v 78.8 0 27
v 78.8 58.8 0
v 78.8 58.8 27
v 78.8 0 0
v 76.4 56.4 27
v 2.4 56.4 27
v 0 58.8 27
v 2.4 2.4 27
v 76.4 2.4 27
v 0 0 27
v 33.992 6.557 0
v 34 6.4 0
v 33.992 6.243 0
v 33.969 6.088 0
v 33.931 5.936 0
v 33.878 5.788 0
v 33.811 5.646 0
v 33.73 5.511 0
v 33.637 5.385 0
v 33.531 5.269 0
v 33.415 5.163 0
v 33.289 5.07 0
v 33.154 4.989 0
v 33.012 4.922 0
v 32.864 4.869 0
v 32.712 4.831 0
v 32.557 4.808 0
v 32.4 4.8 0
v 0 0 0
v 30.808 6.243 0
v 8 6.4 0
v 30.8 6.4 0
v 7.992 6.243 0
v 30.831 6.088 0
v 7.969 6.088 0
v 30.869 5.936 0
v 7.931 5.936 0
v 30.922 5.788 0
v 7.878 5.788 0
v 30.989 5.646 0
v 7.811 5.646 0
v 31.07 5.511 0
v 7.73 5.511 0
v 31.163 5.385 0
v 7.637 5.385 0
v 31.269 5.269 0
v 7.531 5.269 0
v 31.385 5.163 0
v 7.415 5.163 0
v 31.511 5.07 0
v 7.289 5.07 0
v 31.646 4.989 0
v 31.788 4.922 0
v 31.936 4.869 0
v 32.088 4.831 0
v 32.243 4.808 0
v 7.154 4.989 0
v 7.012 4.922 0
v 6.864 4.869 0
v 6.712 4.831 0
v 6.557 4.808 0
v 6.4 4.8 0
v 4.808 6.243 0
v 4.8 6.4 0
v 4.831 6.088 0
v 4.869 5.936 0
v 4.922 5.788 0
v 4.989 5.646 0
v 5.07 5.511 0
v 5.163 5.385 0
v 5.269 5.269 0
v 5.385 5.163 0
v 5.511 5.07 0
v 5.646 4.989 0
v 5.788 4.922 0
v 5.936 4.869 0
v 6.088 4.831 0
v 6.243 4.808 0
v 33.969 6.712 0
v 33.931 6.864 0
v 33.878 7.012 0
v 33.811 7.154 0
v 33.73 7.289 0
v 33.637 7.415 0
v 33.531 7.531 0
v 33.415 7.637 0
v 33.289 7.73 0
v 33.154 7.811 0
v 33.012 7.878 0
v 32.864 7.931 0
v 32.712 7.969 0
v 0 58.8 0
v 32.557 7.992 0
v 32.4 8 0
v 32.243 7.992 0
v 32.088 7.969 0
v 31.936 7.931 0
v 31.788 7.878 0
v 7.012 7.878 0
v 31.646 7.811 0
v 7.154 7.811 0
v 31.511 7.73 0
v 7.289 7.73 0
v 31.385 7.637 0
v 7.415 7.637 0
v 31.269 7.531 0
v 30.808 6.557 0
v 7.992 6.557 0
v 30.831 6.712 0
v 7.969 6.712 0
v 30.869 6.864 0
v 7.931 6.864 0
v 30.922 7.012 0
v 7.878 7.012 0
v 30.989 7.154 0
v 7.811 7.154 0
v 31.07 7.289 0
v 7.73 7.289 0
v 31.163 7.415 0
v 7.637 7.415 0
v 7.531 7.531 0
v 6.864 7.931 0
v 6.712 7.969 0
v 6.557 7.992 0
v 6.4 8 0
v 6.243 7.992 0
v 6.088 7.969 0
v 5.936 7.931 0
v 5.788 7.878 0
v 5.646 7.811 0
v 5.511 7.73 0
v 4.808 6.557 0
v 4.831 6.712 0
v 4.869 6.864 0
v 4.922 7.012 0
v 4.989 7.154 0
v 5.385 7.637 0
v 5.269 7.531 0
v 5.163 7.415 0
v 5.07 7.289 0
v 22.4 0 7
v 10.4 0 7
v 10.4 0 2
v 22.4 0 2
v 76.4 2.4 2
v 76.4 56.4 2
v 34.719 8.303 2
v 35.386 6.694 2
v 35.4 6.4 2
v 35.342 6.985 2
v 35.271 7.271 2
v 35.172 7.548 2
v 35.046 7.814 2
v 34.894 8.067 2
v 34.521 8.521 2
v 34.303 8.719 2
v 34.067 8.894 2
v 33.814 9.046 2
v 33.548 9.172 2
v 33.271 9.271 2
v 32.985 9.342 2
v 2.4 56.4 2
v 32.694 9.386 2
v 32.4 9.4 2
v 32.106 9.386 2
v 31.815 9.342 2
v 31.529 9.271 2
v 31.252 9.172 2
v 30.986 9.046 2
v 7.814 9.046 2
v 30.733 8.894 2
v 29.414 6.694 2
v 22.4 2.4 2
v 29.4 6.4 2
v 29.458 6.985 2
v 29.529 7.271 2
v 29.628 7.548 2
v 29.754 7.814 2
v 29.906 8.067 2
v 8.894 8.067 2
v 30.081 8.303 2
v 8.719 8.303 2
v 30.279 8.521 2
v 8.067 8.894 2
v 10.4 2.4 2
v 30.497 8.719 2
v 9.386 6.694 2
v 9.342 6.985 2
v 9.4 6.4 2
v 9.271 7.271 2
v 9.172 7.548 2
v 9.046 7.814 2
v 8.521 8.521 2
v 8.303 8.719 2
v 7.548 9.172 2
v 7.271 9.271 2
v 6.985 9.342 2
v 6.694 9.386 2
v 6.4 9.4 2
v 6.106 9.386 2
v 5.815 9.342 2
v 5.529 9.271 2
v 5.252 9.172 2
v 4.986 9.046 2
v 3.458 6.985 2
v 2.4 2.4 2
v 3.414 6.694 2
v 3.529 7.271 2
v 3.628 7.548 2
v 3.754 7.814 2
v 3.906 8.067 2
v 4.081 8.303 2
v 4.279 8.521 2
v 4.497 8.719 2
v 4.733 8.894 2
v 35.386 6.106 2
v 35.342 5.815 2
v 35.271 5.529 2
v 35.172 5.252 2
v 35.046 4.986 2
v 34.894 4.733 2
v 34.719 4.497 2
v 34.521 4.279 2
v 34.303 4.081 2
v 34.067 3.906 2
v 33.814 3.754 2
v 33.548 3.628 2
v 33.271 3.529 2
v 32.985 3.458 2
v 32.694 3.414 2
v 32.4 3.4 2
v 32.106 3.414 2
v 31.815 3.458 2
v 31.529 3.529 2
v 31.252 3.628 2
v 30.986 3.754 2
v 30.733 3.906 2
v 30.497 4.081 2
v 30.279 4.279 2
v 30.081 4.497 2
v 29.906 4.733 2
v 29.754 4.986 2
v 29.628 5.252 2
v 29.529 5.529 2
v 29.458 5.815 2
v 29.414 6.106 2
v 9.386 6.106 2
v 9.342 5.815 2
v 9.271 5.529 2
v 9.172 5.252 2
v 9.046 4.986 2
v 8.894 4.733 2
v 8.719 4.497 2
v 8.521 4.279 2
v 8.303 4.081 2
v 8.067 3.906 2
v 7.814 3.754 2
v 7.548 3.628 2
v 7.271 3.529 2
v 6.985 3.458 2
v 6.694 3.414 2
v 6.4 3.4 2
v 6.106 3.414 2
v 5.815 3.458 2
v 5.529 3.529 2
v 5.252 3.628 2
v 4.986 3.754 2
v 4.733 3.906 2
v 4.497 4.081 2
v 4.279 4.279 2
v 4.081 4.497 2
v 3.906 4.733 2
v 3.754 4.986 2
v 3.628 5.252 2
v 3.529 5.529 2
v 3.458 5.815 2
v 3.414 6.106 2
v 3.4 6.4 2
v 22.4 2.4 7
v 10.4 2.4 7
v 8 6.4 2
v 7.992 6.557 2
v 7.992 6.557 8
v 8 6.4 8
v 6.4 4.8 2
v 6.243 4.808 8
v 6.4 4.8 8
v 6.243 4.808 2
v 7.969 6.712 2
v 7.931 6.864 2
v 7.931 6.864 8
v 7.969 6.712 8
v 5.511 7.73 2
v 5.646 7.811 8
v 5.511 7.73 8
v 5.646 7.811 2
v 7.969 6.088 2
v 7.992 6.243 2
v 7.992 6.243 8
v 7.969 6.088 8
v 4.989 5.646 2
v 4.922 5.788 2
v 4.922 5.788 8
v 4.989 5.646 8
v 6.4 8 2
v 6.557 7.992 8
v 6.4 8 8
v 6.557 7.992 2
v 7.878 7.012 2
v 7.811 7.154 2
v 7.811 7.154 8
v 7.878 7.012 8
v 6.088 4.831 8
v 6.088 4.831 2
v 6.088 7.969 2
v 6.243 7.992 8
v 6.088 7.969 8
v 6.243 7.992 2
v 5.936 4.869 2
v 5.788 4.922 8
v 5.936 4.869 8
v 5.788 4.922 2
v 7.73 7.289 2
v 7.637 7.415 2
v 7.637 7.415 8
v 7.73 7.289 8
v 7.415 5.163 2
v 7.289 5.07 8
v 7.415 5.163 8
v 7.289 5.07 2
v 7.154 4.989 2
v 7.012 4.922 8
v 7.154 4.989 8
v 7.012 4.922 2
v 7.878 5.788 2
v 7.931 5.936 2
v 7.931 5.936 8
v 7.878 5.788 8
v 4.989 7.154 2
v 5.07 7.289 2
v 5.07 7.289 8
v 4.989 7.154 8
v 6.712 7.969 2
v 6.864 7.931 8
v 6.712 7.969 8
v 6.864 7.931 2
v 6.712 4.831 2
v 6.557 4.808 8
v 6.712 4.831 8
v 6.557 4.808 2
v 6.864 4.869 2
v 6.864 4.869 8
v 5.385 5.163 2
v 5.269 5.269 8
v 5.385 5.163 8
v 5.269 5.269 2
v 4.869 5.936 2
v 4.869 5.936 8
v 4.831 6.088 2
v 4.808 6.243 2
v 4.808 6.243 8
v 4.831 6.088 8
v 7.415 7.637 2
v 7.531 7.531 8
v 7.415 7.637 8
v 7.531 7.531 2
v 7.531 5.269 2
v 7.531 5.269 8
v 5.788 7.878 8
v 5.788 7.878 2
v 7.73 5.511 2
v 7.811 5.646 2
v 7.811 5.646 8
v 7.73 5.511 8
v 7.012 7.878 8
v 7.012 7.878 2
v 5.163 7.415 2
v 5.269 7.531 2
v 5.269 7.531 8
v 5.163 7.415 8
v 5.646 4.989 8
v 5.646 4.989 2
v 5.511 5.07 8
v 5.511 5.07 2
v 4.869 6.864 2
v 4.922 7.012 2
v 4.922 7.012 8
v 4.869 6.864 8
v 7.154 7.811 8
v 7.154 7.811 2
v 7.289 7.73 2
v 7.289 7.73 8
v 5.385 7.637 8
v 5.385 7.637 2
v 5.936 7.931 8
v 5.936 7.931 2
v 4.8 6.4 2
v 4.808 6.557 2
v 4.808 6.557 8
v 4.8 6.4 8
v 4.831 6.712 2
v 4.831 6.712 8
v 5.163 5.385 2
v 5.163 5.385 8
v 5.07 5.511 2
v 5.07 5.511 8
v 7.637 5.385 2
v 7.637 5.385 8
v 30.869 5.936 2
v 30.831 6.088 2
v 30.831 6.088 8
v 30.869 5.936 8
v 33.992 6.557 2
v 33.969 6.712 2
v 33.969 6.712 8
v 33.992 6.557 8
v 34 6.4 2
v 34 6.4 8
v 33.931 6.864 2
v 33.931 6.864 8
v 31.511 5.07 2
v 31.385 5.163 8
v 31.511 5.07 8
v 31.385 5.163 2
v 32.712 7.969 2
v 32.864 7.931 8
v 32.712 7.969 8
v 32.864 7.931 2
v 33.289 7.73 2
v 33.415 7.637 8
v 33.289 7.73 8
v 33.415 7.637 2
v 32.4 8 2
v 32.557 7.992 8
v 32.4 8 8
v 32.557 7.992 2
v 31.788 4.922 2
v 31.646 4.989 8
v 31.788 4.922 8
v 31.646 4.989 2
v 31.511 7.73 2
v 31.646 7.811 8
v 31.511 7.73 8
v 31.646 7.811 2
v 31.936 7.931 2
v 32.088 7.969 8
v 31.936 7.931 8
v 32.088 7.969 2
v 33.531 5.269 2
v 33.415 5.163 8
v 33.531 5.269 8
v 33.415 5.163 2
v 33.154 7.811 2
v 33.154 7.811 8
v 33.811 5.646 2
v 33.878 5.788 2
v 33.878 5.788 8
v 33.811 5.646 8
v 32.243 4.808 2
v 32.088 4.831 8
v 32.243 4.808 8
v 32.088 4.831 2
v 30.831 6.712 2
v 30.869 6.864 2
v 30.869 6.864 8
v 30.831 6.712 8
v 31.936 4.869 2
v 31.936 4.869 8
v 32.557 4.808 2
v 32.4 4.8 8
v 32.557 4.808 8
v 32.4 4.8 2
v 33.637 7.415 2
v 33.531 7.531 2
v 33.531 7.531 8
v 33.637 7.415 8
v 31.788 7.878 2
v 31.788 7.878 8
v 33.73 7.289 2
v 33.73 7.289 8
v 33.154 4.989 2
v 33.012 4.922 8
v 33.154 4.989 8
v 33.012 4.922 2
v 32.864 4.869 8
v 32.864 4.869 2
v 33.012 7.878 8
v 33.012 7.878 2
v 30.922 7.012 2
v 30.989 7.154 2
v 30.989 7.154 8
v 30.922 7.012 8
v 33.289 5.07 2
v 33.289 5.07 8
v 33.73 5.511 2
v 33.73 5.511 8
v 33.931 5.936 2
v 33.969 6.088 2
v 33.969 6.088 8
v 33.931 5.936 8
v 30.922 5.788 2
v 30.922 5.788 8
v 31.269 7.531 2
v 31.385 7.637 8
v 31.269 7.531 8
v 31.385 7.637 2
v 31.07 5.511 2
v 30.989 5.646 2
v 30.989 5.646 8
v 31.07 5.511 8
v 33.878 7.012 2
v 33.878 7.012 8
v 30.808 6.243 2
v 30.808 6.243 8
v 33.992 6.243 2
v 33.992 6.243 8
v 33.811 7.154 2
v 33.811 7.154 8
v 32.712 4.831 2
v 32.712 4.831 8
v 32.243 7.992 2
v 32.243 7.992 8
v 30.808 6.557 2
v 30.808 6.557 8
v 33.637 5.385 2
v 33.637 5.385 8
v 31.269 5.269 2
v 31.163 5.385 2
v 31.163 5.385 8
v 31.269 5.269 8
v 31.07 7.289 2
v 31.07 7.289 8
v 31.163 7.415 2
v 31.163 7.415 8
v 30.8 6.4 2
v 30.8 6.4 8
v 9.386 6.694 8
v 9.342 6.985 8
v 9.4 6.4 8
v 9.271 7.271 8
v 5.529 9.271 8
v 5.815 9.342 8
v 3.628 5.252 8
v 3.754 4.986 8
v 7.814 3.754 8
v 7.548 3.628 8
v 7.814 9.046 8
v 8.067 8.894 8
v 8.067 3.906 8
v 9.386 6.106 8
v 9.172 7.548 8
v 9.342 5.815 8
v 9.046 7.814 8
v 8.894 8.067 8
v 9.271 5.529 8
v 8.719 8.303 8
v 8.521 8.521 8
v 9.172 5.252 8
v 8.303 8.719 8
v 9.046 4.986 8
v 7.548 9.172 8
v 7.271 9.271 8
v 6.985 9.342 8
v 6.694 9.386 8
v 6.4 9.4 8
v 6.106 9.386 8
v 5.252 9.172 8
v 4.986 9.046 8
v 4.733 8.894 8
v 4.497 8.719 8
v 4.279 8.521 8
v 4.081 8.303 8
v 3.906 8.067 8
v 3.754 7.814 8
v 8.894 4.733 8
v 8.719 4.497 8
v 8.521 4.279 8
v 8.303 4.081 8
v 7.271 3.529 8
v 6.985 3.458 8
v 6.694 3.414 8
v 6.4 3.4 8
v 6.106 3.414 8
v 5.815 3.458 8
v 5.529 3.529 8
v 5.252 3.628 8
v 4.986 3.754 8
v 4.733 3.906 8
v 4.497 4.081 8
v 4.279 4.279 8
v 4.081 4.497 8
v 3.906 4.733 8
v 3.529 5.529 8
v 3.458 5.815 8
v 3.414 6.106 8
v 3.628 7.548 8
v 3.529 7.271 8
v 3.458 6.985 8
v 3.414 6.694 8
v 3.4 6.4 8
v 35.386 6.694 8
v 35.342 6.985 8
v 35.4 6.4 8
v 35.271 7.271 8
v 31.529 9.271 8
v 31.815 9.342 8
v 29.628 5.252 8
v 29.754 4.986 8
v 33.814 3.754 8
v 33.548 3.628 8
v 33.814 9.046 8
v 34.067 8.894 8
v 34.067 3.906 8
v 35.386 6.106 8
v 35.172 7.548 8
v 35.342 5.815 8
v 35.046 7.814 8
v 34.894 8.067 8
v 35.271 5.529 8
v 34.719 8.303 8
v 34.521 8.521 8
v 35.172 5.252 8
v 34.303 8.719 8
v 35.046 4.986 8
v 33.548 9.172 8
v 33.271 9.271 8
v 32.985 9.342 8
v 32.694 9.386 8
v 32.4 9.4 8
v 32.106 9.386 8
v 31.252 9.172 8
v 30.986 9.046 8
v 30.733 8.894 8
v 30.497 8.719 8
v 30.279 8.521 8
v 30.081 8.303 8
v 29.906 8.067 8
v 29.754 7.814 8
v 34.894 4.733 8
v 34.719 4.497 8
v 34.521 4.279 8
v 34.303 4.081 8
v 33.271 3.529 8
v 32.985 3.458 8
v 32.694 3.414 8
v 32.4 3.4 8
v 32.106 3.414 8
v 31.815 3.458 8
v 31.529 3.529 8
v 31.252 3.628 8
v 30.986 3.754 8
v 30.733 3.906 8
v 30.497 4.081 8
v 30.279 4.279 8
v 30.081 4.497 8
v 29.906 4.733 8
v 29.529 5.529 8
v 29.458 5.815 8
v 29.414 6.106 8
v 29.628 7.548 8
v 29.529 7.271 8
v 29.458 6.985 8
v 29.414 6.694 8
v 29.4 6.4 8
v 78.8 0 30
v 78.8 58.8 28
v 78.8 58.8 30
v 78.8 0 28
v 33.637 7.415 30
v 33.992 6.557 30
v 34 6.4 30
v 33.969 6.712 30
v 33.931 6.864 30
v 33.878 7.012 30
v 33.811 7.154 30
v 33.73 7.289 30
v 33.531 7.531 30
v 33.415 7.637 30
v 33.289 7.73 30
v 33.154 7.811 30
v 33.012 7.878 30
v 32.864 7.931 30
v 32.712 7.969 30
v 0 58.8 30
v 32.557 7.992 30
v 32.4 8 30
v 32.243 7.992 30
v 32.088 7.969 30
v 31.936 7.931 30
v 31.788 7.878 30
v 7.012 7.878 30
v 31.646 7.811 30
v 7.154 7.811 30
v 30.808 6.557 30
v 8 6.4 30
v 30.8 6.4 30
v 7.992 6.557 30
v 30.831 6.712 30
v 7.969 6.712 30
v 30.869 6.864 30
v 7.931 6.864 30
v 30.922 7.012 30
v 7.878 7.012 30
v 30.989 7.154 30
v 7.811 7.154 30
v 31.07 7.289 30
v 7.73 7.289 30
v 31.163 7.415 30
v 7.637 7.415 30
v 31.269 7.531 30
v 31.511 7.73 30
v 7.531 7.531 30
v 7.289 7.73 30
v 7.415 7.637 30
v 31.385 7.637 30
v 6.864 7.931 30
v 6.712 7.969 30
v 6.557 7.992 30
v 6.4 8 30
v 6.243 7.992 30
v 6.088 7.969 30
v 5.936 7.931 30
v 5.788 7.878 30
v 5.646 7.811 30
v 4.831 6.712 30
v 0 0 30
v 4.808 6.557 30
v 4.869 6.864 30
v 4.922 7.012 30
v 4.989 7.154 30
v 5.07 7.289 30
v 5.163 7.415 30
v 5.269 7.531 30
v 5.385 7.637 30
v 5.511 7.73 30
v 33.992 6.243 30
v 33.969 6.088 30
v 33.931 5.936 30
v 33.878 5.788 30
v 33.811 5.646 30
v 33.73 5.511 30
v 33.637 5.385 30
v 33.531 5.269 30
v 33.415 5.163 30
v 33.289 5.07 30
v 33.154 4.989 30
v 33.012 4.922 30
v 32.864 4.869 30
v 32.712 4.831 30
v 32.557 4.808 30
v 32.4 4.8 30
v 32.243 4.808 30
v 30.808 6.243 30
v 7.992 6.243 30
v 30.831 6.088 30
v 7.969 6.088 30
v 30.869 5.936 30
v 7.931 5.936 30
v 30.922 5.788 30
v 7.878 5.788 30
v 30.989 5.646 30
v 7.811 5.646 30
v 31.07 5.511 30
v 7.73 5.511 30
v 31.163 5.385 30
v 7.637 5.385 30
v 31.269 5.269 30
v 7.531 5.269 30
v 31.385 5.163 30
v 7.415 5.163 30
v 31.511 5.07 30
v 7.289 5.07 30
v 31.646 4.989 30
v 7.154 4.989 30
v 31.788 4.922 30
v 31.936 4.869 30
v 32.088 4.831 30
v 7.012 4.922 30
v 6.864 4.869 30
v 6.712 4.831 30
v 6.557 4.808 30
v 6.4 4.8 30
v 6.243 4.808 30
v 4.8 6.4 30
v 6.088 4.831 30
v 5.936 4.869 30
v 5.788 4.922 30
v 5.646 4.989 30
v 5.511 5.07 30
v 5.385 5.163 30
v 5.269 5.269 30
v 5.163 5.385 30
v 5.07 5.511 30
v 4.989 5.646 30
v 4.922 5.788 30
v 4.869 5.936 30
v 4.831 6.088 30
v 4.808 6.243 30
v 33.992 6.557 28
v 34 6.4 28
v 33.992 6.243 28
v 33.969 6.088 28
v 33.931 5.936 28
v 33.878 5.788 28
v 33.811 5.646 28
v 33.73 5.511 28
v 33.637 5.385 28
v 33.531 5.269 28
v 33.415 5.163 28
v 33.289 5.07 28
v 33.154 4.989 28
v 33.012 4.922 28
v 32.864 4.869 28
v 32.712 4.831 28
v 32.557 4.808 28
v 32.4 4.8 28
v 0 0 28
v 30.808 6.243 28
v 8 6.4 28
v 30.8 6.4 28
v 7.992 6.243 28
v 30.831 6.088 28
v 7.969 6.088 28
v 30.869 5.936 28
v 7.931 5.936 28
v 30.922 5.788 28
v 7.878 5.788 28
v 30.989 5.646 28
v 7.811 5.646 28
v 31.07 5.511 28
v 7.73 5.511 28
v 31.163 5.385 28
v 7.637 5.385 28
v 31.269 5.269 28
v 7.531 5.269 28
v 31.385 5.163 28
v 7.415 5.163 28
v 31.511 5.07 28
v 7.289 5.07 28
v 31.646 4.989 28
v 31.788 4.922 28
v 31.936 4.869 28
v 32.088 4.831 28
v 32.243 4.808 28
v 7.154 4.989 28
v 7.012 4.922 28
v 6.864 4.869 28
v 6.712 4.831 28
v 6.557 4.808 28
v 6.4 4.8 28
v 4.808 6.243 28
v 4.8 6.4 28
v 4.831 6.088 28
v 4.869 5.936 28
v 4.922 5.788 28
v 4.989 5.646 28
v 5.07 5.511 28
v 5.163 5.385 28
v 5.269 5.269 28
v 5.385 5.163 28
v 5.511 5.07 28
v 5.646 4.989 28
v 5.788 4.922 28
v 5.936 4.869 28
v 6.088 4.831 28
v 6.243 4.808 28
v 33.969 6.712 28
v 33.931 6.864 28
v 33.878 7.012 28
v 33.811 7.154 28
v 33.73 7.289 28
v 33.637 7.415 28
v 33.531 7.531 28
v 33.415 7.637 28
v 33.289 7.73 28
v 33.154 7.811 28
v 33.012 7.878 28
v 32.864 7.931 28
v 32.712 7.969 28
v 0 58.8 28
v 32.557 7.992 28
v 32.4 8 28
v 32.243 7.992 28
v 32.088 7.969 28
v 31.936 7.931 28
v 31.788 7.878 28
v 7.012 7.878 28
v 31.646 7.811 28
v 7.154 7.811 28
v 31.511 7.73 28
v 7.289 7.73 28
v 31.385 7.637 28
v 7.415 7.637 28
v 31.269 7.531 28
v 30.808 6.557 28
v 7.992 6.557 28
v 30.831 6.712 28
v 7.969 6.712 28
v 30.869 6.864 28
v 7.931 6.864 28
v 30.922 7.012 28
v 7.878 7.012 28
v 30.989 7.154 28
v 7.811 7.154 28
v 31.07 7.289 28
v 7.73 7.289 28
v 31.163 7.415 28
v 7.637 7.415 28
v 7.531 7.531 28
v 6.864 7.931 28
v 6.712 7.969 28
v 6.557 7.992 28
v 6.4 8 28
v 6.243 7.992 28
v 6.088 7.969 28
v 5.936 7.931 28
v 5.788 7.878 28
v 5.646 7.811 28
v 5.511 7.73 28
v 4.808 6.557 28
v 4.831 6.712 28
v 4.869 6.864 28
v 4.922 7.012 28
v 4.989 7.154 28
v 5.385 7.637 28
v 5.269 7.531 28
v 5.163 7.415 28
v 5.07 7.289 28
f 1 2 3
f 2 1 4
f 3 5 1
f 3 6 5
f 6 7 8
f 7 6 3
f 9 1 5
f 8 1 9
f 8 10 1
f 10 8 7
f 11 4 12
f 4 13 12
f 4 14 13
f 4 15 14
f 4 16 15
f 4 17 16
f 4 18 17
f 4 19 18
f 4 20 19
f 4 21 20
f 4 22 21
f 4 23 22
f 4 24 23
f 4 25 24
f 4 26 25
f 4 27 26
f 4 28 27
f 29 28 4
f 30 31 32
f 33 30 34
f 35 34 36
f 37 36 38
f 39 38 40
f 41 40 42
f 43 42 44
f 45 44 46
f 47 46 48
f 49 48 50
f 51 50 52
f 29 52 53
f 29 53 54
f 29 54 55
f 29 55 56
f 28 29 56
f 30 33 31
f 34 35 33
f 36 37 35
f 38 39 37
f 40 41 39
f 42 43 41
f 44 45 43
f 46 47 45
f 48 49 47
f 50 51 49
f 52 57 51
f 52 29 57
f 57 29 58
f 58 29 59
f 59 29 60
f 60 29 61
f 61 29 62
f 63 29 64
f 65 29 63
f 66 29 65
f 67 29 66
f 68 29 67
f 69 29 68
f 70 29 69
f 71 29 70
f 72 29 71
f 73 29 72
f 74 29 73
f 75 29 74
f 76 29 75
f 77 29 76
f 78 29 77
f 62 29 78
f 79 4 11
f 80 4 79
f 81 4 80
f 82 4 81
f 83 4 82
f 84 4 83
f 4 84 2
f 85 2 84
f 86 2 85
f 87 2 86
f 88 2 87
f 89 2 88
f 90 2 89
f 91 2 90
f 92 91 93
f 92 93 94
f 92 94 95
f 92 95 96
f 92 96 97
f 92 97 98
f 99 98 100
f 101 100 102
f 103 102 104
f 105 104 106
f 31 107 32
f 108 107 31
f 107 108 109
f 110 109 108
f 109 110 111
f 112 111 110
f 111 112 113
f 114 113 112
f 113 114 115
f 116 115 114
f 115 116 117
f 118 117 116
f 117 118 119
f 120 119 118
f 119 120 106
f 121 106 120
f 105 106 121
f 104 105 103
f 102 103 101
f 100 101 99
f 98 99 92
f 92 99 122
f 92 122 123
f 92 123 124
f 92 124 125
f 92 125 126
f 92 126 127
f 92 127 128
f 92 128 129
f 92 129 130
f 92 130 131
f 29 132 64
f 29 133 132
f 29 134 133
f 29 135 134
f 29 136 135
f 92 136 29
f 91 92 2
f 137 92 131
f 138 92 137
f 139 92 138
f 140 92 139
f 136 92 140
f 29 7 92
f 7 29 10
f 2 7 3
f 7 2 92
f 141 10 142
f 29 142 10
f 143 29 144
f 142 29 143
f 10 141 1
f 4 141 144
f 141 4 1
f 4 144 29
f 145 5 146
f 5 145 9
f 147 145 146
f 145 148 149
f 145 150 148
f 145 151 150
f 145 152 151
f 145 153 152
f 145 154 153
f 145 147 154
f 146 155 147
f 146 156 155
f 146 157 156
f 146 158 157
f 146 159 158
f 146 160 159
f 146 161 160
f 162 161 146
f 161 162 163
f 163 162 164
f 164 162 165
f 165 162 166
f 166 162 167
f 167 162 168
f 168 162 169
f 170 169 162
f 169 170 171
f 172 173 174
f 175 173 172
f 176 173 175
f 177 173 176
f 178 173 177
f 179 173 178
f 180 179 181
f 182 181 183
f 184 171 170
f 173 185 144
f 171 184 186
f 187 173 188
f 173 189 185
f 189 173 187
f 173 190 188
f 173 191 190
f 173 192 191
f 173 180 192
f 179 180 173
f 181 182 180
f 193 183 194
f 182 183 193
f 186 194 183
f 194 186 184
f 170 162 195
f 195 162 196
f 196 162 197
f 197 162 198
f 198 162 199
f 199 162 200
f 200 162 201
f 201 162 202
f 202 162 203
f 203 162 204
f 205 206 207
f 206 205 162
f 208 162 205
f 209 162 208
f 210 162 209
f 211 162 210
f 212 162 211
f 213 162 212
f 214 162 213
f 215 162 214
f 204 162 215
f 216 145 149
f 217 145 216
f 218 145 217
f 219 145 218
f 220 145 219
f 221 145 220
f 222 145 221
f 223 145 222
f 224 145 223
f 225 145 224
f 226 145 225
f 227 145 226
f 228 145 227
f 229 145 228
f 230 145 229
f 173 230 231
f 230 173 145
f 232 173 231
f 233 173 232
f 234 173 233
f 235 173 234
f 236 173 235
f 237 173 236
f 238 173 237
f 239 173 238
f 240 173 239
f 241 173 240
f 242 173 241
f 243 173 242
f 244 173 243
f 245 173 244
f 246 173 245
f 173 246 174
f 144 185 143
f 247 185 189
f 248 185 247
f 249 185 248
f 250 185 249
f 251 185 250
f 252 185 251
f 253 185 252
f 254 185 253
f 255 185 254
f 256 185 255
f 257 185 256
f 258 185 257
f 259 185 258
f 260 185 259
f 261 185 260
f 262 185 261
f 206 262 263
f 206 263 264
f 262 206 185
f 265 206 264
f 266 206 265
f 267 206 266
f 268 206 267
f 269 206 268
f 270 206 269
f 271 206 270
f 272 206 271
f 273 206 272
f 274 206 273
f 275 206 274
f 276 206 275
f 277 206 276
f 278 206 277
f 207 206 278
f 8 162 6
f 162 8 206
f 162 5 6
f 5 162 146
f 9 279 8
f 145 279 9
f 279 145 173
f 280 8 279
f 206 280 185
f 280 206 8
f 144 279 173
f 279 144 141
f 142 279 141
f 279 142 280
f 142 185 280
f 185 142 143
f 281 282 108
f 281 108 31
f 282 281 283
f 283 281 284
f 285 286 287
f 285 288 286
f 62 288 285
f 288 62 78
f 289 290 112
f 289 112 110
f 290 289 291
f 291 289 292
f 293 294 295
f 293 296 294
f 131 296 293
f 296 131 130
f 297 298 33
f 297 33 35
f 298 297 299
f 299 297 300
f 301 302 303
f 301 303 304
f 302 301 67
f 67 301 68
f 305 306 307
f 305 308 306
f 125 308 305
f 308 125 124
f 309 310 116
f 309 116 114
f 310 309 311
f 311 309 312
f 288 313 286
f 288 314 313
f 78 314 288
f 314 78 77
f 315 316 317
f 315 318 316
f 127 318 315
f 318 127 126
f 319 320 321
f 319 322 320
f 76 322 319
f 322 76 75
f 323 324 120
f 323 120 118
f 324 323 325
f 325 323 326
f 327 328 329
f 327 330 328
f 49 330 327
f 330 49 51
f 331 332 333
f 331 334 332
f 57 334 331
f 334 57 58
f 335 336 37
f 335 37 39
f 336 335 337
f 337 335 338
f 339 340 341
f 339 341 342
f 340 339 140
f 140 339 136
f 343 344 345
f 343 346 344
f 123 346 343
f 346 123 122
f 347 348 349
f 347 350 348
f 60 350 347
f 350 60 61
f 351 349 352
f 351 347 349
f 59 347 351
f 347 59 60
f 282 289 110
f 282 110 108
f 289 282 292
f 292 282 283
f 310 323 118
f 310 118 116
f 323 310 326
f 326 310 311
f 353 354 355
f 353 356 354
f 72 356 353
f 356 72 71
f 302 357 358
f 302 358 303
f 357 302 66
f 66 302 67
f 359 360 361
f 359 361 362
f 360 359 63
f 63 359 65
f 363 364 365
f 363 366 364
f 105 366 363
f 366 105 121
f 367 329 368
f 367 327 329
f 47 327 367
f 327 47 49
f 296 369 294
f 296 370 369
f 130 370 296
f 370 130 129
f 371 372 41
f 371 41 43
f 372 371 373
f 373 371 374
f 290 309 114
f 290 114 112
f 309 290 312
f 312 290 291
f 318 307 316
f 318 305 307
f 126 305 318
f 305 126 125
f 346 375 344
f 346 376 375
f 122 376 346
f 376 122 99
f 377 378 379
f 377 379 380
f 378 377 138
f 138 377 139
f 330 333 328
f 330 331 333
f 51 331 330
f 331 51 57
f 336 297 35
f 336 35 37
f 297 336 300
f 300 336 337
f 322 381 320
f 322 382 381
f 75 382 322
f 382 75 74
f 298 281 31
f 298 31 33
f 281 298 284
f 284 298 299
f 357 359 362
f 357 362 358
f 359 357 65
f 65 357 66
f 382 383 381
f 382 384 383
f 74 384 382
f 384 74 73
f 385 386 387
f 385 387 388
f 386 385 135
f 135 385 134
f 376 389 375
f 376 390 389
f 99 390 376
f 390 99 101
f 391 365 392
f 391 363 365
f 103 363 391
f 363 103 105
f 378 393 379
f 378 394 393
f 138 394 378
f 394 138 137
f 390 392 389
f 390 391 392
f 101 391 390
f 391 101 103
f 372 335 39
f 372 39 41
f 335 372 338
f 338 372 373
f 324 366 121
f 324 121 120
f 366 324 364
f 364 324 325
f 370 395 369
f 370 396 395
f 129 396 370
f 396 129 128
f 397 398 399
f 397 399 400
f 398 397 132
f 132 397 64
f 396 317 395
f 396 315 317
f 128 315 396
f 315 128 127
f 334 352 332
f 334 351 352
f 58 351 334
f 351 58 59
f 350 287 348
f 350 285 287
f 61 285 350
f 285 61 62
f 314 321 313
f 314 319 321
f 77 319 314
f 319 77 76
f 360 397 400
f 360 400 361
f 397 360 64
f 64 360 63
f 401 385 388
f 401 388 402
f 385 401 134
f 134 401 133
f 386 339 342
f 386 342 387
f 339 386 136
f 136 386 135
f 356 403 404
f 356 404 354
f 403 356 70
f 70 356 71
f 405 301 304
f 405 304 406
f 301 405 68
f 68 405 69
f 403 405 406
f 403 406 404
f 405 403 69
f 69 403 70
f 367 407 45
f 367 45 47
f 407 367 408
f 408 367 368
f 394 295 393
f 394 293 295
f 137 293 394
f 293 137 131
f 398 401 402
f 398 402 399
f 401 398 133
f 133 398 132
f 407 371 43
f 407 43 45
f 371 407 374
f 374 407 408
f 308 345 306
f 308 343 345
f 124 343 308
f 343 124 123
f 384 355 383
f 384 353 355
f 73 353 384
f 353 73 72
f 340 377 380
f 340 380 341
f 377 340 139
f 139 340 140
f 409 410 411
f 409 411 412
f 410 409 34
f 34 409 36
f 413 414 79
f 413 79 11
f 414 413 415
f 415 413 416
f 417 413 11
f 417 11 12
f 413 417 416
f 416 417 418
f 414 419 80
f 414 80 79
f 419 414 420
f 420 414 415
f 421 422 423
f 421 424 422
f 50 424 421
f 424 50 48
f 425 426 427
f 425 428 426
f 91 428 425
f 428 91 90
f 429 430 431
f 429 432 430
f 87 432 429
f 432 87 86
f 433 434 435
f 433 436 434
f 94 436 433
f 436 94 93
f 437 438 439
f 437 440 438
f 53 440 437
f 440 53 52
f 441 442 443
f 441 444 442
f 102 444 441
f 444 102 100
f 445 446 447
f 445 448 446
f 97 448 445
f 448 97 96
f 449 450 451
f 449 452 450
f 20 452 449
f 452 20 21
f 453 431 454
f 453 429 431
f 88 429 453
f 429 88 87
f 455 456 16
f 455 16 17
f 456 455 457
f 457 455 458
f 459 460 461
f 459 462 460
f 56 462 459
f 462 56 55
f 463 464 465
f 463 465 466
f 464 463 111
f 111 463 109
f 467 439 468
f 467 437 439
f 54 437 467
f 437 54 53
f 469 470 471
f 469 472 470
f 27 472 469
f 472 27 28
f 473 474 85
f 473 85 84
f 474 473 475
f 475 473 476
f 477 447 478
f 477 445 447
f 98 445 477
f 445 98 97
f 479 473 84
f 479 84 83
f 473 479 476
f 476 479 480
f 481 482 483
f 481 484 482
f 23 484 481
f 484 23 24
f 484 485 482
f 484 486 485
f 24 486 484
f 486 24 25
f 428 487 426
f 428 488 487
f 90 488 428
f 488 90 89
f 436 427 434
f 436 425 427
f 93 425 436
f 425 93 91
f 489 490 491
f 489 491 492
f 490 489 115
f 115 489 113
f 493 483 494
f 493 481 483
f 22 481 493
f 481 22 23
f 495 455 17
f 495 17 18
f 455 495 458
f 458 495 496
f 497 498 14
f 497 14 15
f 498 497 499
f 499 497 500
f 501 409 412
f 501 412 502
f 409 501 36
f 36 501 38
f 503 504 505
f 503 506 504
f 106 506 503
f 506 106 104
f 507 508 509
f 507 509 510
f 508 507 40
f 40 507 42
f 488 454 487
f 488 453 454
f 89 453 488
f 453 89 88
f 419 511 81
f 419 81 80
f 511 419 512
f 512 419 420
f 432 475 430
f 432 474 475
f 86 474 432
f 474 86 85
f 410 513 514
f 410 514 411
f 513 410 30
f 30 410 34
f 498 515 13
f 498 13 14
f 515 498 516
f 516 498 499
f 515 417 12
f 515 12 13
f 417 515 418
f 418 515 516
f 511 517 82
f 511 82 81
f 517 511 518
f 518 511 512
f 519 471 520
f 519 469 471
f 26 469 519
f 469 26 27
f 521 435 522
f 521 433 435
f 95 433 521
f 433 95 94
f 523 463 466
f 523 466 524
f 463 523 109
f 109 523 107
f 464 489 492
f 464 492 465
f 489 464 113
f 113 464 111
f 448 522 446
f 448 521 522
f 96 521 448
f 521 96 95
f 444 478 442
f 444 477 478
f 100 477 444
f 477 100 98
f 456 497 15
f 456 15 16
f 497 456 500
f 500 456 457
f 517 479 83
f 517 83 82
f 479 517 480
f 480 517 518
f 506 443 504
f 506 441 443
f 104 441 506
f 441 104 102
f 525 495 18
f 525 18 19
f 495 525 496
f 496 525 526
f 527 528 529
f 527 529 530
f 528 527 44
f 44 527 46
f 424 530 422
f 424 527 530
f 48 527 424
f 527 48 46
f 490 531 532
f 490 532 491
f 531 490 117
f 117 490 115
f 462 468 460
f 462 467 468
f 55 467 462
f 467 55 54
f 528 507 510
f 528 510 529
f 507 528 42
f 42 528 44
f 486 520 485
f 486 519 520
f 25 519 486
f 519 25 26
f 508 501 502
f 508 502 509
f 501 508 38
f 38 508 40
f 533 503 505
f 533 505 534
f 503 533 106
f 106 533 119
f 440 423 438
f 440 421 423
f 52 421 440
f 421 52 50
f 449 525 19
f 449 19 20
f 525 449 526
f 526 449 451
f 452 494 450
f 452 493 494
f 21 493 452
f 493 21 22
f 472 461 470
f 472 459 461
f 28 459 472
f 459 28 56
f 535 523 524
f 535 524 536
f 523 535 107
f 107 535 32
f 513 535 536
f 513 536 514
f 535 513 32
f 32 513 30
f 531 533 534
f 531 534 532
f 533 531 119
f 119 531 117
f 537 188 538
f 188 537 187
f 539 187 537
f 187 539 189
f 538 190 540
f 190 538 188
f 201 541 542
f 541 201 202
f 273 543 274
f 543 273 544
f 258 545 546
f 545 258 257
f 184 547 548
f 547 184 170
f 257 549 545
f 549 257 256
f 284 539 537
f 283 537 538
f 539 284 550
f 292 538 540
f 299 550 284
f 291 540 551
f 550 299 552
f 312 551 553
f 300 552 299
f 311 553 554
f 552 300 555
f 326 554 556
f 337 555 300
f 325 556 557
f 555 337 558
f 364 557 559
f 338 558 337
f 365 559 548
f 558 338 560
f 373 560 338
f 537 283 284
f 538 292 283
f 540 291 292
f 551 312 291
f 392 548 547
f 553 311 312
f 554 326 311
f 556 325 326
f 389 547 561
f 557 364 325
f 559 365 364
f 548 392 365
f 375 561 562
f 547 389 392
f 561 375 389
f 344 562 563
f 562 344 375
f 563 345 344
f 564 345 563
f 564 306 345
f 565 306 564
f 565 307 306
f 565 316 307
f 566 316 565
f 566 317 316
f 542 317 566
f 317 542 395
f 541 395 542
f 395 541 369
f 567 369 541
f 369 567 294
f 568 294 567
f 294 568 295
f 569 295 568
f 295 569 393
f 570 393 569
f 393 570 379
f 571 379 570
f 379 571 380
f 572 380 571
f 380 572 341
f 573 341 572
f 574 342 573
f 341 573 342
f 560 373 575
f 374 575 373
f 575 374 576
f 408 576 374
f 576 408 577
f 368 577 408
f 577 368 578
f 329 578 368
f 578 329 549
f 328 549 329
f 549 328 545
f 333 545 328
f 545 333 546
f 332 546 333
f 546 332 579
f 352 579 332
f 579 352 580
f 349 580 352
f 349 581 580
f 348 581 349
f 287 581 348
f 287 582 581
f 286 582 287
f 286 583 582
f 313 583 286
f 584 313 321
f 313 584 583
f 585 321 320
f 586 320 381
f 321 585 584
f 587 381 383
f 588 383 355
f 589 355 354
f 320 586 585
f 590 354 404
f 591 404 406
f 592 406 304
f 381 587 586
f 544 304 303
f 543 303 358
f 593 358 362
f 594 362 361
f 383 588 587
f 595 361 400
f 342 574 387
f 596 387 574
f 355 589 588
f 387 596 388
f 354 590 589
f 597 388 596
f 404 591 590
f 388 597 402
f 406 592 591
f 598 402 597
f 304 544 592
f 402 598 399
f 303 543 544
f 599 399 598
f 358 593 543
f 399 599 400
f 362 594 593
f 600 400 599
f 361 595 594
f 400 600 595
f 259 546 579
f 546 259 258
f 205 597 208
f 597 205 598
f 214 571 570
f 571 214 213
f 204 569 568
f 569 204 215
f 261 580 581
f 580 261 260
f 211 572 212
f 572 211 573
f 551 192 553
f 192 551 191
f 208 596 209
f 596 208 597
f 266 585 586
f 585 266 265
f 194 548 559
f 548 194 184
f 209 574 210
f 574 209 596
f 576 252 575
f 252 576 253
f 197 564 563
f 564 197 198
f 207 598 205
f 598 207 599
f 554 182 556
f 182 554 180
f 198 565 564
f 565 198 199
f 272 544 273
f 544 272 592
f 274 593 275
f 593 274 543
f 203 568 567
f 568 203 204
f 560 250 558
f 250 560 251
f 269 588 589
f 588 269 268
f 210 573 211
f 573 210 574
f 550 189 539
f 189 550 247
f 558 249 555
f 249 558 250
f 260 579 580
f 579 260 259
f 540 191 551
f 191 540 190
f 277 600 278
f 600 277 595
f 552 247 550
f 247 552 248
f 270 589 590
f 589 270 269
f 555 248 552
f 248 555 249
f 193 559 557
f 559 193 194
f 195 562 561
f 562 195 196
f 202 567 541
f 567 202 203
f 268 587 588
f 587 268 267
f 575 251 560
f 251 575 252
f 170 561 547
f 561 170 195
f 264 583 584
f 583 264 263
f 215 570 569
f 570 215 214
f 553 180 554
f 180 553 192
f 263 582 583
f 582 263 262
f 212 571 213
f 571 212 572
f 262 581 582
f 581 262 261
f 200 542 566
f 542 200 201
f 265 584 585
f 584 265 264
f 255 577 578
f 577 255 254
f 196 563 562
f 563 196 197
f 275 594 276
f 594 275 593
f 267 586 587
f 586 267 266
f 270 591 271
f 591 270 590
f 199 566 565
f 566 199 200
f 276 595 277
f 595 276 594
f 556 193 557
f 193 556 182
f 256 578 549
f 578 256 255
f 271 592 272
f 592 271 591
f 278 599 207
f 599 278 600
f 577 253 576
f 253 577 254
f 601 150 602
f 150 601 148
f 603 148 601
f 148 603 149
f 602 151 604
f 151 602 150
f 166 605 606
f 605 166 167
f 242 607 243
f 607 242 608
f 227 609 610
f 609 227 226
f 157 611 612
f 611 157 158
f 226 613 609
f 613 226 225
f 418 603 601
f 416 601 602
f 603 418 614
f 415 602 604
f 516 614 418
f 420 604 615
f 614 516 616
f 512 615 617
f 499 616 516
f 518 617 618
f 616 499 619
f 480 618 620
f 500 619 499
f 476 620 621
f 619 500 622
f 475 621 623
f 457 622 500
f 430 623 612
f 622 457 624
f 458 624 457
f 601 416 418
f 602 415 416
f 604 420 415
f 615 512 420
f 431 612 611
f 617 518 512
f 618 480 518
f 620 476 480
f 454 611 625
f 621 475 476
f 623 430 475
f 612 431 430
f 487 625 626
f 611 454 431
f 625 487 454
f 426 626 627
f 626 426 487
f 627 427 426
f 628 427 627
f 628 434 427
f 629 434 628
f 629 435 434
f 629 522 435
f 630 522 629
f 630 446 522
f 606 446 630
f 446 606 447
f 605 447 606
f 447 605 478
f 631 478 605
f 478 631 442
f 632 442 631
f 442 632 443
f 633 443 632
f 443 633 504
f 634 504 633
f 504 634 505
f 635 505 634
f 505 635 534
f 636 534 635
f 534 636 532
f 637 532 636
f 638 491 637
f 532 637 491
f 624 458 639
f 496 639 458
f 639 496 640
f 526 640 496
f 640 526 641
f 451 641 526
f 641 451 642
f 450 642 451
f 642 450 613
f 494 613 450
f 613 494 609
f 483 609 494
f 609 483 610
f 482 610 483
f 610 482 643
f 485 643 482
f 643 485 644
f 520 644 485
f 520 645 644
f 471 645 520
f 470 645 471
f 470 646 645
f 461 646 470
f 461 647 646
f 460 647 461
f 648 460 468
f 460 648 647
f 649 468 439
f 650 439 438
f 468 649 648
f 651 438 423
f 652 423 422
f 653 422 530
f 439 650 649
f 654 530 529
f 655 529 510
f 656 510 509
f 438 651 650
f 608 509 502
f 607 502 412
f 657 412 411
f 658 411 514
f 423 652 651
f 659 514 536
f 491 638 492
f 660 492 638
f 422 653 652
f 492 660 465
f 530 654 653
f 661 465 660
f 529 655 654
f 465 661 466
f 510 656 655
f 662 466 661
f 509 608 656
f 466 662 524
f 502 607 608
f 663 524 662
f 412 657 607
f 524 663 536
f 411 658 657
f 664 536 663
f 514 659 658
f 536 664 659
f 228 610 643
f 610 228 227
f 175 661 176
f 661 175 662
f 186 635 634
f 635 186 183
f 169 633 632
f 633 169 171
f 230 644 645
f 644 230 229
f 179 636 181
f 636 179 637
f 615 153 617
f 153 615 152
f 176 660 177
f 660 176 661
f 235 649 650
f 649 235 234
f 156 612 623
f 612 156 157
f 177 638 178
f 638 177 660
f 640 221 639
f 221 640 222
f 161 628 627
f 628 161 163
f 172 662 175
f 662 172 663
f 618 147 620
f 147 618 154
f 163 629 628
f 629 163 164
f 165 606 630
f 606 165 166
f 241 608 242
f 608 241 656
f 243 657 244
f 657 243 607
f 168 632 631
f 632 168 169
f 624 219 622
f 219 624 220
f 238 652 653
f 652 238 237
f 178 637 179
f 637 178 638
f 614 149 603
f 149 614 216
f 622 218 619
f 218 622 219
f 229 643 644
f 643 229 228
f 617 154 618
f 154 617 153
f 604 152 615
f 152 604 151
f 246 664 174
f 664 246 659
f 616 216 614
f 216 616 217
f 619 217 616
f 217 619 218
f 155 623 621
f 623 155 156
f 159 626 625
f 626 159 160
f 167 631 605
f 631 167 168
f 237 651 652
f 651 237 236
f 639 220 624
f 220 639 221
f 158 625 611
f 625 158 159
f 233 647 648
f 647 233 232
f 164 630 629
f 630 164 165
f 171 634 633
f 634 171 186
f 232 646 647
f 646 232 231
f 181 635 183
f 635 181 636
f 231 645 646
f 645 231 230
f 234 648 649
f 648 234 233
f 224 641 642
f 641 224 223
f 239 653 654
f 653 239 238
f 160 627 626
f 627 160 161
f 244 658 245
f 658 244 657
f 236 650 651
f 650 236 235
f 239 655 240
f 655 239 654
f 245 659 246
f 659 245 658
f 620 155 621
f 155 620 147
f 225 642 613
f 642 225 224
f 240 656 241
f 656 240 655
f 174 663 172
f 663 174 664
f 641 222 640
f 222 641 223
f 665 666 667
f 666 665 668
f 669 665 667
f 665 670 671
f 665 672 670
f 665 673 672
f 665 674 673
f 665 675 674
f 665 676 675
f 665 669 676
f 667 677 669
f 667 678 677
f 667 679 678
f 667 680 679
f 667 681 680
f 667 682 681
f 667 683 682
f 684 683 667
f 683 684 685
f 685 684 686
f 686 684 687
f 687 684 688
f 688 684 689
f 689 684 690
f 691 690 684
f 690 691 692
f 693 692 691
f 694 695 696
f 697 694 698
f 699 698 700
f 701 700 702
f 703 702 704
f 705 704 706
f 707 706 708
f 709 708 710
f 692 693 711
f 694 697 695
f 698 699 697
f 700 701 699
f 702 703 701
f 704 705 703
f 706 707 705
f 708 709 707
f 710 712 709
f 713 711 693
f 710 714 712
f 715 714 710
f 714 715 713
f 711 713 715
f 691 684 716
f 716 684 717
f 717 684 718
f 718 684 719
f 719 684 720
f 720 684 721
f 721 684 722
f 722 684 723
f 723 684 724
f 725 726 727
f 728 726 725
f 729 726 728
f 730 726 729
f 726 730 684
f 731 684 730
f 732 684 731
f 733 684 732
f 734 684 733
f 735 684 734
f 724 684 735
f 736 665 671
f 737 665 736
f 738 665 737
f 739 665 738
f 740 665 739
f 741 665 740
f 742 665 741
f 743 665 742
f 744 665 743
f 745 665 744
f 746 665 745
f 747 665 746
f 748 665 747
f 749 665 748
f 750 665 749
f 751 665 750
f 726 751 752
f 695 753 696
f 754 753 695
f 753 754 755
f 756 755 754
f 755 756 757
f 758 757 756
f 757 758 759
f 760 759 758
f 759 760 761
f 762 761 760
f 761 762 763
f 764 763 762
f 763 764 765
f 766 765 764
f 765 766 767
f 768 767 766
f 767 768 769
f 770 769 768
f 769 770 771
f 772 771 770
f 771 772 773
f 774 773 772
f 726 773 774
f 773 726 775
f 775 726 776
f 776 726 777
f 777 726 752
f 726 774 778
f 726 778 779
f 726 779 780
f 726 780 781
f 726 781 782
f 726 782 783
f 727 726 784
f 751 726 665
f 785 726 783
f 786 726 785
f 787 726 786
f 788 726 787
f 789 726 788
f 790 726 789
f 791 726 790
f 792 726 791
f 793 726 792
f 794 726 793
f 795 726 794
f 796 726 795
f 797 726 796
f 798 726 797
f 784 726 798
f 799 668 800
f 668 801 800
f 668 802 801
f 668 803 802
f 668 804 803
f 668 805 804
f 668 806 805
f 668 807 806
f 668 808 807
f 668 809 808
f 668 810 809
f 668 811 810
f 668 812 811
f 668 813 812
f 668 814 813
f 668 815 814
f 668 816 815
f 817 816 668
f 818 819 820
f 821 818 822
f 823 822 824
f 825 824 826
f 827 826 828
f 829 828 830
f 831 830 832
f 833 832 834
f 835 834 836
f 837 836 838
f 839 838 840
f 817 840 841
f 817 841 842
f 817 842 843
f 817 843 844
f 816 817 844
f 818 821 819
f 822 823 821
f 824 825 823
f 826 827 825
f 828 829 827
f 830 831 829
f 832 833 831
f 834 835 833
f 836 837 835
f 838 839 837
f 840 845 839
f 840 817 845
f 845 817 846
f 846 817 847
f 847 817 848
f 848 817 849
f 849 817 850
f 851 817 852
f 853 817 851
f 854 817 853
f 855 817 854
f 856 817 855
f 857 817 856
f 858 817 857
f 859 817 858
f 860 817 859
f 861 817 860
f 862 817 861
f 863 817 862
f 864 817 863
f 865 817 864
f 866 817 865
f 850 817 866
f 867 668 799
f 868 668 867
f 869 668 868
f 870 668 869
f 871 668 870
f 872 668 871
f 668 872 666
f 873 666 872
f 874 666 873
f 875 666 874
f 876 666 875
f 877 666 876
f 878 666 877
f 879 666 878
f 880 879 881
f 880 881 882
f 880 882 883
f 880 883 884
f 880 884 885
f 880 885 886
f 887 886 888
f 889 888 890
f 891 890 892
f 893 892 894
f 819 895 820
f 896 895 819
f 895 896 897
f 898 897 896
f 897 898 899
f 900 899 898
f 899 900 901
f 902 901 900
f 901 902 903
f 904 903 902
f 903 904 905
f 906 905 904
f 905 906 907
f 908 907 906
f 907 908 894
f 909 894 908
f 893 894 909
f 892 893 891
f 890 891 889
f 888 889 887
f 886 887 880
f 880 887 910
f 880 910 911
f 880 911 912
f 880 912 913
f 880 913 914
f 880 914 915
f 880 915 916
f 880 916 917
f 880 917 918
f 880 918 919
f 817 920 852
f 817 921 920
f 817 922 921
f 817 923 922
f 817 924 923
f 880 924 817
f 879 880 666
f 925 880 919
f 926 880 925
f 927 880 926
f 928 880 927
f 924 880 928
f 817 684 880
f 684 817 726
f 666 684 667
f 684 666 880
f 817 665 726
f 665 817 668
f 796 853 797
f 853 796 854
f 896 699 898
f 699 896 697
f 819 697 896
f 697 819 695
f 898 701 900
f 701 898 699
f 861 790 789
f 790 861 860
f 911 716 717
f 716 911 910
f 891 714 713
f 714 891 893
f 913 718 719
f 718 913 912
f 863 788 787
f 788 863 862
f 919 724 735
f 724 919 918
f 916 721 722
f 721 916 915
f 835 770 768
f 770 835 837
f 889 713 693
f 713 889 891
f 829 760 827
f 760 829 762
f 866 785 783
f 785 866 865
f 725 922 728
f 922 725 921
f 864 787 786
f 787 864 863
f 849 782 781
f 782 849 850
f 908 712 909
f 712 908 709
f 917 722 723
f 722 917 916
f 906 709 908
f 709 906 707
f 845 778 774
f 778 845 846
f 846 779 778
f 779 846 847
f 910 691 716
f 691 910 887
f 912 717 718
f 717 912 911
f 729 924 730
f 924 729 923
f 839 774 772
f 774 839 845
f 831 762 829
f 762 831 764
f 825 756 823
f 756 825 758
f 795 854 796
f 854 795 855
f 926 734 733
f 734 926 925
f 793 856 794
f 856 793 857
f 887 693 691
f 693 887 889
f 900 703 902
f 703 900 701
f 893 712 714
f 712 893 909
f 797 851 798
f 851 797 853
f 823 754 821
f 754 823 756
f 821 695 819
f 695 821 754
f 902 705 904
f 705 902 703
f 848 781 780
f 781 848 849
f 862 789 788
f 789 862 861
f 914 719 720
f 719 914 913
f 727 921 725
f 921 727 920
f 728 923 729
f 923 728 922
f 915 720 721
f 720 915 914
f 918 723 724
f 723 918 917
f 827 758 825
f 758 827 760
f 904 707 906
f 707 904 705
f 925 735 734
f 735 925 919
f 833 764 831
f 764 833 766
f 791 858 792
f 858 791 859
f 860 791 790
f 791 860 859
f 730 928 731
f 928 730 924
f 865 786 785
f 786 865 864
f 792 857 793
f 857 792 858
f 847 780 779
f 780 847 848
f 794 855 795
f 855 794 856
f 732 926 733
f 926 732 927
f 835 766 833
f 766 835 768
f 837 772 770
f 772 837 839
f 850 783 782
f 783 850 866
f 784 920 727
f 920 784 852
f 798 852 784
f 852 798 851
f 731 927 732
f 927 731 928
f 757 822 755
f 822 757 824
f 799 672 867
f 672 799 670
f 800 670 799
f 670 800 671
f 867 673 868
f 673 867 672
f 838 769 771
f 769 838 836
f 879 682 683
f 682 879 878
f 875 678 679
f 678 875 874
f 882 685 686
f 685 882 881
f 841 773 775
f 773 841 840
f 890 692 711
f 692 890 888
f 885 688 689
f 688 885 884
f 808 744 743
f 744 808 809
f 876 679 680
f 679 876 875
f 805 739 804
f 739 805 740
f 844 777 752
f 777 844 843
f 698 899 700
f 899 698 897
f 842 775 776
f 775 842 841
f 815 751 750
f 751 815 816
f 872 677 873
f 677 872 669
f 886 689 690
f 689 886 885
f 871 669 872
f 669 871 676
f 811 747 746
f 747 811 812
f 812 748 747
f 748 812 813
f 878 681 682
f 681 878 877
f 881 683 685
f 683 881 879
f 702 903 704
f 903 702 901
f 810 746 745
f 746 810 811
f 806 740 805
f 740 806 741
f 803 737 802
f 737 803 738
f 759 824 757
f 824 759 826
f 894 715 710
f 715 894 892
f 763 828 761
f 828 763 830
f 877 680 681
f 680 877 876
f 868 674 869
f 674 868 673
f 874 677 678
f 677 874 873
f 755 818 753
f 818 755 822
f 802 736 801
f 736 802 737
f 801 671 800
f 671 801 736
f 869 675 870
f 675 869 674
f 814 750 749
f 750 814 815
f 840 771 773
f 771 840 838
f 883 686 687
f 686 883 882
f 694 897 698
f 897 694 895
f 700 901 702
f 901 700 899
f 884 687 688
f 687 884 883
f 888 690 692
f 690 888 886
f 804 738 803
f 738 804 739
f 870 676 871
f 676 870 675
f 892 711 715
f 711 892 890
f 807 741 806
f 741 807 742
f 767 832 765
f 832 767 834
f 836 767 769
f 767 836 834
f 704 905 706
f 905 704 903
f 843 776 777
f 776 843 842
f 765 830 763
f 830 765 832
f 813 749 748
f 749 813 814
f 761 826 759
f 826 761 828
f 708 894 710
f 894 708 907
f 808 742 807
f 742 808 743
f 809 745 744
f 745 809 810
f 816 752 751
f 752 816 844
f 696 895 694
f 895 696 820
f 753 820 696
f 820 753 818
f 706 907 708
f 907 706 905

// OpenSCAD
// Auto-generated by Mecha-Splicer
// enclosure=ctrl_box_4_enclosure

$fn = 64;

inner_w = 74.0;
inner_d = 54.0;
inner_h = 25.0;
wall = 2.4;
floor = 2.0;
lid_t = 2.0;
standoff_h = 6.0;
standoff_od = 6.0;
standoff_hole_d = 3.2;

module base() {
  union() {
    difference() {
      cube([78.8, 58.8, 27.0], center=false);
      translate([2.4, 2.4, 2.0]) cube([74.0, 54.0, 25.0], center=false);
    translate([10.4, 0, 2.0]) cube([12.0, 3.4, 5.0], center=false);
      translate([6.4, 6.4, -1]) cylinder(h=29.0, d=3.2, center=false);
      translate([32.4, 6.4, -1]) cylinder(h=29.0, d=3.2, center=false);
    }
    // Standoffs
    difference() {
      union() {
        translate([6.4, 6.4, 2.0]) cylinder(h=standoff_h, d=standoff_od, center=false);
        translate([32.4, 6.4, 2.0]) cylinder(h=standoff_h, d=standoff_od, center=false);
      }
      translate([6.4, 6.4, 1.0]) cylinder(h=standoff_h + 2, d=standoff_hole_d, center=false);
      translate([32.4, 6.4, 1.0]) cylinder(h=standoff_h + 2, d=standoff_hole_d, center=false);
    }
  }
}

module lid() {
  difference() {
    cube([78.8, 58.8, 2.0], center=false);
    translate([6.4, 6.4, -1]) cylinder(h=4.0, d=3.2, center=false);
    translate([32.4, 6.4, -1]) cylinder(h=4.0, d=3.2, center=false);
  }
}

module enclosure() {
  base();
  translate([0, 0, 28.0]) lid();
}
enclosure();
